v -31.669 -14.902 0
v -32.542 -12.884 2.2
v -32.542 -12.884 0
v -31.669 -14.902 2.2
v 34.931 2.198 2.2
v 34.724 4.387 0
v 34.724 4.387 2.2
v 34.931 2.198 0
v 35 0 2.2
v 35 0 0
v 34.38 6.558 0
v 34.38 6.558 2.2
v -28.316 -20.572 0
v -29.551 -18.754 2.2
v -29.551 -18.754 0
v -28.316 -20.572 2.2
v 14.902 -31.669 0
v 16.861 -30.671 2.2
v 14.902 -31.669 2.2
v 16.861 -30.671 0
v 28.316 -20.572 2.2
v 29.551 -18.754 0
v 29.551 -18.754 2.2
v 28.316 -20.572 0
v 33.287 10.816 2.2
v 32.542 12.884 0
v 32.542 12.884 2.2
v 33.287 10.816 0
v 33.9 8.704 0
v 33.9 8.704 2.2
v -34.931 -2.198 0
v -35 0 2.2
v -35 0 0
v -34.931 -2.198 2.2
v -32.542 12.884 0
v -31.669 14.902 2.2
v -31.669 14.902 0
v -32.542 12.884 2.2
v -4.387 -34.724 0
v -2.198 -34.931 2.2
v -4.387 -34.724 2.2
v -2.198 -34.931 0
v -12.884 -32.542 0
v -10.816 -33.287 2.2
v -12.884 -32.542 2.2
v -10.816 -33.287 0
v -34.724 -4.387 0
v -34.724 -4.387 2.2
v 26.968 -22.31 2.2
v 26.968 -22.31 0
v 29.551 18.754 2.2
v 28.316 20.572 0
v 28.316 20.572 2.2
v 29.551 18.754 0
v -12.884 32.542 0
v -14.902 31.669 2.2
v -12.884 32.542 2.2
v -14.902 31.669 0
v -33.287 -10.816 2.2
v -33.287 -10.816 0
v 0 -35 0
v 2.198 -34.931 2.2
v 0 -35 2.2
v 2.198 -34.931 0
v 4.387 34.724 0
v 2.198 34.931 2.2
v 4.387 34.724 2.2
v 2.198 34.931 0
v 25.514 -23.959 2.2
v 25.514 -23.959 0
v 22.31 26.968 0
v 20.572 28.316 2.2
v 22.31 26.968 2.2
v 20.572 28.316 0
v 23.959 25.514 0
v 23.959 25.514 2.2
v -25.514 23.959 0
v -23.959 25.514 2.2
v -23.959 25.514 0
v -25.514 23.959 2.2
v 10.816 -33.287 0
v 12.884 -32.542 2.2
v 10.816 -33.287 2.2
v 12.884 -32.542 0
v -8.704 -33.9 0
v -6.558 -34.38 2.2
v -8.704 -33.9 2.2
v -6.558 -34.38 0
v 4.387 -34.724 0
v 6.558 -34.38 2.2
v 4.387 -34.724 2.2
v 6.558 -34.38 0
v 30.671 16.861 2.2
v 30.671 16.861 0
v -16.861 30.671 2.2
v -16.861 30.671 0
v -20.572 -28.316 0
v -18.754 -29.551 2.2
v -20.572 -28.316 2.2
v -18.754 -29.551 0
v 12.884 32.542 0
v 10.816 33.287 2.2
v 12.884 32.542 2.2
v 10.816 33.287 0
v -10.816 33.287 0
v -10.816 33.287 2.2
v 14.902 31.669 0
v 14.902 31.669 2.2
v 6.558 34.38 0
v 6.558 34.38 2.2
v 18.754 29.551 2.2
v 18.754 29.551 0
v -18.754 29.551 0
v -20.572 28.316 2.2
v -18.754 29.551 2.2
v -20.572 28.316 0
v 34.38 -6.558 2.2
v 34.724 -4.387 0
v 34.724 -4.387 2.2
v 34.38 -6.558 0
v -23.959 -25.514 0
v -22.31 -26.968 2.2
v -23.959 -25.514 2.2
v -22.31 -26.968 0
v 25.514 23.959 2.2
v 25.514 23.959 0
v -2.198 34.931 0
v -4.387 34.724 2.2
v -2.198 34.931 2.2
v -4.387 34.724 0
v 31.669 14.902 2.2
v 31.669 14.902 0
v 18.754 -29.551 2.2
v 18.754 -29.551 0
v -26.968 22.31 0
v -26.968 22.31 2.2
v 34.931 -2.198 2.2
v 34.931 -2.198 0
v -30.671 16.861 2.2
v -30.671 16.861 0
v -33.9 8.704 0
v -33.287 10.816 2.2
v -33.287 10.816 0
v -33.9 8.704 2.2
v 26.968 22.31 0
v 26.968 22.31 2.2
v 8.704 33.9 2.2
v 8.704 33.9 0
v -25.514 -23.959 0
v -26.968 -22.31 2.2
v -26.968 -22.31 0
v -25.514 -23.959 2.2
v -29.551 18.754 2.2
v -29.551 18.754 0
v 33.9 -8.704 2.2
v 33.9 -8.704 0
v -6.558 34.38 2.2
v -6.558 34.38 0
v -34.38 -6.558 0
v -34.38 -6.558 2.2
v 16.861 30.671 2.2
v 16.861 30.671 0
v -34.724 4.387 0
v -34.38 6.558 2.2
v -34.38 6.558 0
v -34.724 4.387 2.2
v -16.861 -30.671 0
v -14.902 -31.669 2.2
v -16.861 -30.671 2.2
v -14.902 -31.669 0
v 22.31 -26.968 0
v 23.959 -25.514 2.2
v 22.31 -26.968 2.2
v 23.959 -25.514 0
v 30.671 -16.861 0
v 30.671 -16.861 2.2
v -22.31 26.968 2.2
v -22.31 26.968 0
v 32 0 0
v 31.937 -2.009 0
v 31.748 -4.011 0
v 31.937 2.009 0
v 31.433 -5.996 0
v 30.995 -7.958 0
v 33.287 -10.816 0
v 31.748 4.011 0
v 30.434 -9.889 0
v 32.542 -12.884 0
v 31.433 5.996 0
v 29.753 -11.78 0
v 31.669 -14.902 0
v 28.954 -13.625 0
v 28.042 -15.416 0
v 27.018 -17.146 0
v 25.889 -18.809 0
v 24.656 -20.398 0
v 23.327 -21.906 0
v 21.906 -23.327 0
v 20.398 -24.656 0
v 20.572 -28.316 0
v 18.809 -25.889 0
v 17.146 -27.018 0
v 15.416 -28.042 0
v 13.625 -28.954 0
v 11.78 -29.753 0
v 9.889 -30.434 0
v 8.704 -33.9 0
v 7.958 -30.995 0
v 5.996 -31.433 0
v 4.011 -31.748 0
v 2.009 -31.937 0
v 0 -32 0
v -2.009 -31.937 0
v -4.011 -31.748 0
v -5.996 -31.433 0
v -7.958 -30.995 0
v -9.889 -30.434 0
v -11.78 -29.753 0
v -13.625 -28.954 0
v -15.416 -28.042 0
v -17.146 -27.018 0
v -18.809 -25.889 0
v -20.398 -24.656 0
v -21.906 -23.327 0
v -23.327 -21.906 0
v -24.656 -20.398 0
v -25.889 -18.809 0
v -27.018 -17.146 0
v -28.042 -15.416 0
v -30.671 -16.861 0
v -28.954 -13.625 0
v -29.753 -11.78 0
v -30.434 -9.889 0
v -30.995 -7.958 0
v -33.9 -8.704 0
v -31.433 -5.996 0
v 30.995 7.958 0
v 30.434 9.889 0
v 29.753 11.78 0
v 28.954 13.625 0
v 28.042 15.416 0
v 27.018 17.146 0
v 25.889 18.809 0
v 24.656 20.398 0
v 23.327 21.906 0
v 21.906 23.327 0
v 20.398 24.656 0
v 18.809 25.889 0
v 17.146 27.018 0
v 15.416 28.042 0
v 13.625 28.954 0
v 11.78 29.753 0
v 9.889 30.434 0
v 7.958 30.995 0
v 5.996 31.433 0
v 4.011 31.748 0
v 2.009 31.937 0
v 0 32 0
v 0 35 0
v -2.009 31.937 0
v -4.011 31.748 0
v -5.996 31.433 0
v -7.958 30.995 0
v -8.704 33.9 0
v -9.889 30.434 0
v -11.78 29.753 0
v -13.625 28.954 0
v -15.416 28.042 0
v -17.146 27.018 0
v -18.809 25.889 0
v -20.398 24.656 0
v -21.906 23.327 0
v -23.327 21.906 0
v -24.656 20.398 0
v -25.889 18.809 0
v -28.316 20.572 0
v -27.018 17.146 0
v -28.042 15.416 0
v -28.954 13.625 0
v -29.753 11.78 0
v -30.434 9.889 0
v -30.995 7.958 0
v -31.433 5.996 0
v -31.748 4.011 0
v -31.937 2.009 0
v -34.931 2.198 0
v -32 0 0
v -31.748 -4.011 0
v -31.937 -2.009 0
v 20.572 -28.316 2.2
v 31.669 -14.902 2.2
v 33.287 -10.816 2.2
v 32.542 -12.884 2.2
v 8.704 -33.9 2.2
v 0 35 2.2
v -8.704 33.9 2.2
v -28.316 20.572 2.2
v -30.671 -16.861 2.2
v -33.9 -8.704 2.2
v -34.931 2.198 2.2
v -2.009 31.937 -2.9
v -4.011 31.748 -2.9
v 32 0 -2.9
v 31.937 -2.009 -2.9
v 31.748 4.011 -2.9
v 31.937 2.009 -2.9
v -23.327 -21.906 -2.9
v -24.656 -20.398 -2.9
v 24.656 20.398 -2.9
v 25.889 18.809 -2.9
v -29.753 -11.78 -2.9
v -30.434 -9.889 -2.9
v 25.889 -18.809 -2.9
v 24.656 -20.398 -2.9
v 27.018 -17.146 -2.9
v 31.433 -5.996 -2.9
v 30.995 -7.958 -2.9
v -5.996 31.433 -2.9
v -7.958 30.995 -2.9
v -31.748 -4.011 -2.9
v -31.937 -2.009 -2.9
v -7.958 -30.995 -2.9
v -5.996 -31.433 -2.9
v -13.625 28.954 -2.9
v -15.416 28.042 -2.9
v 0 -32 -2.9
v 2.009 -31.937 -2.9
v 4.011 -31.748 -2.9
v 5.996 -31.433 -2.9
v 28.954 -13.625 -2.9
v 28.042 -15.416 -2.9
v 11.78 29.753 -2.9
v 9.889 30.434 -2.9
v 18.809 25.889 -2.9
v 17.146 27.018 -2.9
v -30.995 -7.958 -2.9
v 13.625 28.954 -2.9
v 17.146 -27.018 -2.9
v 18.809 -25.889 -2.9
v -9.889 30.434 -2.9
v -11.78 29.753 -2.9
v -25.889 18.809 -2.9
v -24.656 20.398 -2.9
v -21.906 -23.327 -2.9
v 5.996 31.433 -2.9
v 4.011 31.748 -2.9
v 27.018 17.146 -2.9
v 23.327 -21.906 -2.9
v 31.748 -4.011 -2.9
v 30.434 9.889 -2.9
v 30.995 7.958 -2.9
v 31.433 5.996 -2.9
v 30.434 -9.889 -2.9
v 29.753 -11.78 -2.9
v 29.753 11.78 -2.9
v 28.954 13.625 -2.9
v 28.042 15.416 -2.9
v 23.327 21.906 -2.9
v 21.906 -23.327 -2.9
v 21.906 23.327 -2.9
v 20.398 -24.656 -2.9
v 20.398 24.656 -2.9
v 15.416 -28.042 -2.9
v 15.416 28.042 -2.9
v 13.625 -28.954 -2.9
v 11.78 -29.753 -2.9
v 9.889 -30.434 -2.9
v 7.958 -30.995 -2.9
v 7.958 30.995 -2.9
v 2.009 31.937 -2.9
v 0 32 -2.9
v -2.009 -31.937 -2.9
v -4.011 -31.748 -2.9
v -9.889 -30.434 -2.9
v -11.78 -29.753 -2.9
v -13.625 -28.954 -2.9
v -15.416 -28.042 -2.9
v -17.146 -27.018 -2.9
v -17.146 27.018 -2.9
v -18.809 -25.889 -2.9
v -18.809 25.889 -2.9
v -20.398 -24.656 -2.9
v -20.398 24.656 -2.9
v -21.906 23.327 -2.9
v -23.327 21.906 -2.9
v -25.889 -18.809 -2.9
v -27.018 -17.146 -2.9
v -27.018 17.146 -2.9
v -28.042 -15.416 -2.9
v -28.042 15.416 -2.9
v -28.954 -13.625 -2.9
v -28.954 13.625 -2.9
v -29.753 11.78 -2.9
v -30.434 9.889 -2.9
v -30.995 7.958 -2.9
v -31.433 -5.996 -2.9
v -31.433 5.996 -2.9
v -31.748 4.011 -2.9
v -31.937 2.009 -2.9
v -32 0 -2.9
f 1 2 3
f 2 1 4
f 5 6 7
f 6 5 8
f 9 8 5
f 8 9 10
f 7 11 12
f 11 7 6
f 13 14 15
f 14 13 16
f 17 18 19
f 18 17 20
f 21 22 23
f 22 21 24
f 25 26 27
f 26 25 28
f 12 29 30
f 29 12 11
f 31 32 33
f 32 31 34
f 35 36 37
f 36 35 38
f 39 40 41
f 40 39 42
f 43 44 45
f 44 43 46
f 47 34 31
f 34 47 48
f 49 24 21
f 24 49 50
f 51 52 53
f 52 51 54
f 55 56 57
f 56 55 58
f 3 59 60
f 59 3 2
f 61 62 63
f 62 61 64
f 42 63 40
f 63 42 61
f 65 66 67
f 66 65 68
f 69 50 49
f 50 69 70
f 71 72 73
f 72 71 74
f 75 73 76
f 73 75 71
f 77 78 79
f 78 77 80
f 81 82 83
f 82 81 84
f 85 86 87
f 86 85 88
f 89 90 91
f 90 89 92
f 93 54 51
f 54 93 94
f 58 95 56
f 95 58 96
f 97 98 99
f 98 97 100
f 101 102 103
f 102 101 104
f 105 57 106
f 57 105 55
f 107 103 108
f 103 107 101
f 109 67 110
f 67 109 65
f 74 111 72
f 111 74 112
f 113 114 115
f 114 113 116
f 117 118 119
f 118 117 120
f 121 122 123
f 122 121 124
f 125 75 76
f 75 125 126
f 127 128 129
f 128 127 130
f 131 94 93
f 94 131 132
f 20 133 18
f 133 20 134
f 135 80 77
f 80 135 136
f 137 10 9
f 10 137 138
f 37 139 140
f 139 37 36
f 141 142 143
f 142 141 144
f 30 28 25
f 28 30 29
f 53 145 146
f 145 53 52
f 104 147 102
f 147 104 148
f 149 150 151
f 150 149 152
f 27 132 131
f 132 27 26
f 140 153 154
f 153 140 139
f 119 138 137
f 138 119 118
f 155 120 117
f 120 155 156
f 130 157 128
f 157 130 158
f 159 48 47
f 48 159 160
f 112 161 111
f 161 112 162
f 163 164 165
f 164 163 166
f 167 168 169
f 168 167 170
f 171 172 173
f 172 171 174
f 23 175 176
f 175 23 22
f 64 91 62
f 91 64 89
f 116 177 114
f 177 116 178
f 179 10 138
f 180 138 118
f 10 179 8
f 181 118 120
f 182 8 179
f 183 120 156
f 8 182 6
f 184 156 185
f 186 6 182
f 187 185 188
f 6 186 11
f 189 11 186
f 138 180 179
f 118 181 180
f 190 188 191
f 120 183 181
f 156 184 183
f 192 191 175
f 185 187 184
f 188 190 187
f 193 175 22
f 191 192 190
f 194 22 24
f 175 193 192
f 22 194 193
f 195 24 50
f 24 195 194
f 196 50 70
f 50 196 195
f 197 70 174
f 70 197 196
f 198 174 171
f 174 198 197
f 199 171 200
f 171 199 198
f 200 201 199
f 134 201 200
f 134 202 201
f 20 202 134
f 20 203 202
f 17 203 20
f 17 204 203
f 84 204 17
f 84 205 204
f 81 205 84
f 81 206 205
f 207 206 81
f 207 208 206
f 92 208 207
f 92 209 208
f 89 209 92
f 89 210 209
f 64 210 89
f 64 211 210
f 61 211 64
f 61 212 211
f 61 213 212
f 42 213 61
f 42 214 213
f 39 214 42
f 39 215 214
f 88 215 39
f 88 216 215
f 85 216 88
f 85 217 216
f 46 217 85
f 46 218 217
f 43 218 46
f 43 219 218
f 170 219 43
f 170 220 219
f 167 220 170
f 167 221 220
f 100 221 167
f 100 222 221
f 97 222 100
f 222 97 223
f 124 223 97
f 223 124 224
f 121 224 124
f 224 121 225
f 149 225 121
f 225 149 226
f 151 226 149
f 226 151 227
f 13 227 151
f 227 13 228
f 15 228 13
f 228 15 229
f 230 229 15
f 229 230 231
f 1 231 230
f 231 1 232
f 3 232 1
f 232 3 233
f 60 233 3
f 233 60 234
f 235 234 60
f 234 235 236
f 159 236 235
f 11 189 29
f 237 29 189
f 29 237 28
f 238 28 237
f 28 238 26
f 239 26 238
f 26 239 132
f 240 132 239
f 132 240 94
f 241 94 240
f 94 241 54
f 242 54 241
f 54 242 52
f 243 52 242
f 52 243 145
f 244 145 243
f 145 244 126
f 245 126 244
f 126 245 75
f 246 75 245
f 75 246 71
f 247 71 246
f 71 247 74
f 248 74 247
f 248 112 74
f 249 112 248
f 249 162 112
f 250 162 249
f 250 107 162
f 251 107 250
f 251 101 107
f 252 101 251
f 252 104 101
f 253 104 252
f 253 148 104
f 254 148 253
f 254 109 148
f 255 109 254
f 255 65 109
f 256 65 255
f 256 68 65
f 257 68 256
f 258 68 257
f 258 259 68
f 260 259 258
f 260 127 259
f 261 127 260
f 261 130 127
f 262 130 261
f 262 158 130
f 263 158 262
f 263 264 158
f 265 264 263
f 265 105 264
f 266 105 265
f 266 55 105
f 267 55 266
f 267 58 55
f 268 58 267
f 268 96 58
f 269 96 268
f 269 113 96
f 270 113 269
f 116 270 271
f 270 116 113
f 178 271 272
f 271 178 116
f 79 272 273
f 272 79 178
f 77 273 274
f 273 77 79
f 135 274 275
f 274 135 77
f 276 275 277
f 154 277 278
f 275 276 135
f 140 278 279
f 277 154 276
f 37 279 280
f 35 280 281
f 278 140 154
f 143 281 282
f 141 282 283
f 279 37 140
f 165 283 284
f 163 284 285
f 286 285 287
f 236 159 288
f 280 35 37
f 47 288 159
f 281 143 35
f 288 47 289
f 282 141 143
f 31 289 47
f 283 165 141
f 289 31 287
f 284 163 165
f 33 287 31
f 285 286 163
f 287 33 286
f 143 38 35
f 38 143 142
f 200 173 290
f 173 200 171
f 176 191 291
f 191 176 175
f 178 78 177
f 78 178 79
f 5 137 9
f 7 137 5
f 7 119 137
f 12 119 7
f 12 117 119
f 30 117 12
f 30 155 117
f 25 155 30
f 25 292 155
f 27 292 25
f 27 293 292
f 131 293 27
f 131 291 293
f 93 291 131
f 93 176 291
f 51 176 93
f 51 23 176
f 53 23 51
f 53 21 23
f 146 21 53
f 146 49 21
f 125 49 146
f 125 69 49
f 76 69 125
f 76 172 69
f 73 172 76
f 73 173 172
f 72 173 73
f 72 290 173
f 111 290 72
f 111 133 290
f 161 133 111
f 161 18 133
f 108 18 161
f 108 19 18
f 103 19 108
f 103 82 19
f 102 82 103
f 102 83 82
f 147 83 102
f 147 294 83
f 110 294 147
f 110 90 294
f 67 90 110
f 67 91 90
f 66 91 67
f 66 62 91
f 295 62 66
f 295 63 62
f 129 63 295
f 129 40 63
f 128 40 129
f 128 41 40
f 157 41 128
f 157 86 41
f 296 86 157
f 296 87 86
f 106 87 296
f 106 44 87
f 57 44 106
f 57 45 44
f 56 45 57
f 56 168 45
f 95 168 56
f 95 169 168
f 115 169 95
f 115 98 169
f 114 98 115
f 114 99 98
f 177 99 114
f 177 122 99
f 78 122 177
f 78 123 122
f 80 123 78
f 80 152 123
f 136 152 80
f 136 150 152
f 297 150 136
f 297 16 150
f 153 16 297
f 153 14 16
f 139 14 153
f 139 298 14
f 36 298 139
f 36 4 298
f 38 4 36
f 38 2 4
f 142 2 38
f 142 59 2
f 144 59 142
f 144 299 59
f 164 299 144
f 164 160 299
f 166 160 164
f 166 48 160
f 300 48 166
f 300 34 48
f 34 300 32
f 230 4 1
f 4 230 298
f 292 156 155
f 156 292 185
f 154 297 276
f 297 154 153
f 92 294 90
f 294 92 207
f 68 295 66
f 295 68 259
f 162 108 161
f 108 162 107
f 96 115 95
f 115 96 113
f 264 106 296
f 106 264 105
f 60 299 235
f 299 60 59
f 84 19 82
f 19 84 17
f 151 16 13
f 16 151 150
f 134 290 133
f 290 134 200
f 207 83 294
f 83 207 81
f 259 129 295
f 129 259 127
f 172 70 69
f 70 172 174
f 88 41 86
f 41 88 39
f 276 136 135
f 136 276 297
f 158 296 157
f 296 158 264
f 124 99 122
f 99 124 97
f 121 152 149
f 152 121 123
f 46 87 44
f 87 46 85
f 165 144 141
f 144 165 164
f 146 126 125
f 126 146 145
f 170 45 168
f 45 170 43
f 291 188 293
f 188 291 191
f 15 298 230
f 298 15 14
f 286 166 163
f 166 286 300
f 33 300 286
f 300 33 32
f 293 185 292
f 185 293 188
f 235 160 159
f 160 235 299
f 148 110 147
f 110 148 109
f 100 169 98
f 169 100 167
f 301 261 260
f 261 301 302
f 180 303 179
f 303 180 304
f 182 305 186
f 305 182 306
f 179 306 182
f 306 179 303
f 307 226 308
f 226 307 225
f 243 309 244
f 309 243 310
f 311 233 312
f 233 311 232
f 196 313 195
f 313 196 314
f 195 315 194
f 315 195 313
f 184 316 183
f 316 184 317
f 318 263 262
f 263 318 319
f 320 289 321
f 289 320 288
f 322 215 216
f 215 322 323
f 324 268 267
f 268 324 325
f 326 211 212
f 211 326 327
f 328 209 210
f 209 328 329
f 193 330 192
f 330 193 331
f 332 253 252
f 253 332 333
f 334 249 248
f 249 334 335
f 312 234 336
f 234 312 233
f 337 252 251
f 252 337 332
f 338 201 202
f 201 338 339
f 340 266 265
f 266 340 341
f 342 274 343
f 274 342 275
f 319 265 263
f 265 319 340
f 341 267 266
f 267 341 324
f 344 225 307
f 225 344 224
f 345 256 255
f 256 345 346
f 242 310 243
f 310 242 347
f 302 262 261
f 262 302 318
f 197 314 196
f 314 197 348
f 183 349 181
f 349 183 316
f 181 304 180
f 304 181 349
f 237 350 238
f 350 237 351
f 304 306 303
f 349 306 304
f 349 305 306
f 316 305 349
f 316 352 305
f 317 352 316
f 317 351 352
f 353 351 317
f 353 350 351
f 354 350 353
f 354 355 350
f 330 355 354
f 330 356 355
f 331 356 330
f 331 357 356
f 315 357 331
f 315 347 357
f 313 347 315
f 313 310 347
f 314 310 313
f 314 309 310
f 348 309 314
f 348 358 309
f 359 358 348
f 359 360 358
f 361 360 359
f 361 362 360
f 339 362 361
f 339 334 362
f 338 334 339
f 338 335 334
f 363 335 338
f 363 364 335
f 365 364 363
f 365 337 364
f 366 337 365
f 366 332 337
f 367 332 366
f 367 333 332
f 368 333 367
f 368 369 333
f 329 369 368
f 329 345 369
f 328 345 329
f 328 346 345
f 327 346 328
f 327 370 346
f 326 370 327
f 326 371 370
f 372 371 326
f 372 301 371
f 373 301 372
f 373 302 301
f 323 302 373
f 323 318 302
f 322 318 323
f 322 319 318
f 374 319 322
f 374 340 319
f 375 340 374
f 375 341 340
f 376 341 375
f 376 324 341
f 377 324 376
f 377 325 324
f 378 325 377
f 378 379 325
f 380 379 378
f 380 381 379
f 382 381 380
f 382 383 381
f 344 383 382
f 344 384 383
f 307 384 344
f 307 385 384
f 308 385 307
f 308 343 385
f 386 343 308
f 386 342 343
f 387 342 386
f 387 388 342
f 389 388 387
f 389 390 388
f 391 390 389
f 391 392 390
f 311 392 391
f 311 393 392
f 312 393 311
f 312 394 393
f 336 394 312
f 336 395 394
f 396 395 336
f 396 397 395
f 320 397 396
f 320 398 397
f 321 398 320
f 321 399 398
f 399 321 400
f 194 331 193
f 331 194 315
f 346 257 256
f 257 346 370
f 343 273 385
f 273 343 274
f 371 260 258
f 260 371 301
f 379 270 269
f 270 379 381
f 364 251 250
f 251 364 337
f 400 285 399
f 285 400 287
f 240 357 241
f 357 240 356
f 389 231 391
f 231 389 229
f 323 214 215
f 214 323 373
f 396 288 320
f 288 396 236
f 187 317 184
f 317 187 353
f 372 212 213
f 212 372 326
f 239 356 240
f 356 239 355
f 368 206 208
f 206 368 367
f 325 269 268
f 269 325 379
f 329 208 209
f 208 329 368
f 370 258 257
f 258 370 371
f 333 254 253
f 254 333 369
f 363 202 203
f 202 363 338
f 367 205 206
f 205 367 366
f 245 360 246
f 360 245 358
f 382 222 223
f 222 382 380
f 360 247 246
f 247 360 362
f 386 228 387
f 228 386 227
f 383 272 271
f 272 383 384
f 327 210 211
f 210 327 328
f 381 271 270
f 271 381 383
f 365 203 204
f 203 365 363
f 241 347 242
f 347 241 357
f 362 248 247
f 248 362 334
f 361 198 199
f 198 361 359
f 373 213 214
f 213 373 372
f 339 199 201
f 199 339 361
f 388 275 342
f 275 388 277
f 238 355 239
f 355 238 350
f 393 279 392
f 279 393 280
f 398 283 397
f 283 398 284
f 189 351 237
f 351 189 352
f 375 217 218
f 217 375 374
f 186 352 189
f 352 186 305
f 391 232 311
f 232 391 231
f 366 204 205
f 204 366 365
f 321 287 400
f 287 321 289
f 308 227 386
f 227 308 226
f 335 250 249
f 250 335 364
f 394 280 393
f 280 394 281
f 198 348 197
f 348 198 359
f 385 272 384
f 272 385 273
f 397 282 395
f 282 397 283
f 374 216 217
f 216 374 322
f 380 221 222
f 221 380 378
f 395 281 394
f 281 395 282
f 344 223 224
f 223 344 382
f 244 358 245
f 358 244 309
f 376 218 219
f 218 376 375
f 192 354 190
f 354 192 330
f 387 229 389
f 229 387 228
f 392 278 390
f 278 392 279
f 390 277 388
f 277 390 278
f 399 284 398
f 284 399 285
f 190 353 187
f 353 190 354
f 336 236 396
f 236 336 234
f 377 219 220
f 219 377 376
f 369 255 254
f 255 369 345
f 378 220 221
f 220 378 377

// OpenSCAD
// ============================================================
// Ornate lid — layered relief exploration
// Piranesi/Escher-density recursive border + a small "robotic
// pastoral" scene (Pollen-Pod-like creature among coral/vine
// mounds) in the center, using the heightmap/surface() pipeline
// from the cameo project (deliberately, this time, for a piece
// whose only job is to be looked at).
//
// Standalone exploration -- not yet matched to a specific box
// body. LID_D is a starting guess; true up once a box diameter
// is actually chosen.
// ============================================================

LID_D        = 70;     // lid diameter, mm -- placeholder until a box exists
RELIEF_DEPTH = 3.2;     // mm, total height variation across the relief
BASE_T       = 2.2;     // mm, solid base thickness under the relief
HM_PX        = 240;     // heightmap resolution (must match gen_heightmap.py)

// Simple lip on the underside so this can seat into a box opening
// later -- sized generously for now, true up once the box exists.
LIP_D = LID_D - 6;
LIP_H = 3.0;

$fn = 100;

module lid_blank() {
    union() {
        // base disc
        cylinder(h = BASE_T, d = LID_D);

        // seating lip, underside
        translate([0, 0, -LIP_H + 0.1])
            cylinder(h = LIP_H, d = LIP_D);

        // relief surface, scaled from pixel space into real mm and
        // into RELIEF_DEPTH, then trimmed round by the intersection
        // below
        intersection() {
            translate([-LID_D/2, -LID_D/2, BASE_T])
                scale([LID_D / HM_PX, LID_D / HM_PX, RELIEF_DEPTH / 65535])
                    surface(file = "lid_heightmap.png", center = false, convexity = 10);
            translate([0, 0, BASE_T])
                cylinder(h = RELIEF_DEPTH + 1, d = LID_D);
        }
    }
}

lid_blank();
